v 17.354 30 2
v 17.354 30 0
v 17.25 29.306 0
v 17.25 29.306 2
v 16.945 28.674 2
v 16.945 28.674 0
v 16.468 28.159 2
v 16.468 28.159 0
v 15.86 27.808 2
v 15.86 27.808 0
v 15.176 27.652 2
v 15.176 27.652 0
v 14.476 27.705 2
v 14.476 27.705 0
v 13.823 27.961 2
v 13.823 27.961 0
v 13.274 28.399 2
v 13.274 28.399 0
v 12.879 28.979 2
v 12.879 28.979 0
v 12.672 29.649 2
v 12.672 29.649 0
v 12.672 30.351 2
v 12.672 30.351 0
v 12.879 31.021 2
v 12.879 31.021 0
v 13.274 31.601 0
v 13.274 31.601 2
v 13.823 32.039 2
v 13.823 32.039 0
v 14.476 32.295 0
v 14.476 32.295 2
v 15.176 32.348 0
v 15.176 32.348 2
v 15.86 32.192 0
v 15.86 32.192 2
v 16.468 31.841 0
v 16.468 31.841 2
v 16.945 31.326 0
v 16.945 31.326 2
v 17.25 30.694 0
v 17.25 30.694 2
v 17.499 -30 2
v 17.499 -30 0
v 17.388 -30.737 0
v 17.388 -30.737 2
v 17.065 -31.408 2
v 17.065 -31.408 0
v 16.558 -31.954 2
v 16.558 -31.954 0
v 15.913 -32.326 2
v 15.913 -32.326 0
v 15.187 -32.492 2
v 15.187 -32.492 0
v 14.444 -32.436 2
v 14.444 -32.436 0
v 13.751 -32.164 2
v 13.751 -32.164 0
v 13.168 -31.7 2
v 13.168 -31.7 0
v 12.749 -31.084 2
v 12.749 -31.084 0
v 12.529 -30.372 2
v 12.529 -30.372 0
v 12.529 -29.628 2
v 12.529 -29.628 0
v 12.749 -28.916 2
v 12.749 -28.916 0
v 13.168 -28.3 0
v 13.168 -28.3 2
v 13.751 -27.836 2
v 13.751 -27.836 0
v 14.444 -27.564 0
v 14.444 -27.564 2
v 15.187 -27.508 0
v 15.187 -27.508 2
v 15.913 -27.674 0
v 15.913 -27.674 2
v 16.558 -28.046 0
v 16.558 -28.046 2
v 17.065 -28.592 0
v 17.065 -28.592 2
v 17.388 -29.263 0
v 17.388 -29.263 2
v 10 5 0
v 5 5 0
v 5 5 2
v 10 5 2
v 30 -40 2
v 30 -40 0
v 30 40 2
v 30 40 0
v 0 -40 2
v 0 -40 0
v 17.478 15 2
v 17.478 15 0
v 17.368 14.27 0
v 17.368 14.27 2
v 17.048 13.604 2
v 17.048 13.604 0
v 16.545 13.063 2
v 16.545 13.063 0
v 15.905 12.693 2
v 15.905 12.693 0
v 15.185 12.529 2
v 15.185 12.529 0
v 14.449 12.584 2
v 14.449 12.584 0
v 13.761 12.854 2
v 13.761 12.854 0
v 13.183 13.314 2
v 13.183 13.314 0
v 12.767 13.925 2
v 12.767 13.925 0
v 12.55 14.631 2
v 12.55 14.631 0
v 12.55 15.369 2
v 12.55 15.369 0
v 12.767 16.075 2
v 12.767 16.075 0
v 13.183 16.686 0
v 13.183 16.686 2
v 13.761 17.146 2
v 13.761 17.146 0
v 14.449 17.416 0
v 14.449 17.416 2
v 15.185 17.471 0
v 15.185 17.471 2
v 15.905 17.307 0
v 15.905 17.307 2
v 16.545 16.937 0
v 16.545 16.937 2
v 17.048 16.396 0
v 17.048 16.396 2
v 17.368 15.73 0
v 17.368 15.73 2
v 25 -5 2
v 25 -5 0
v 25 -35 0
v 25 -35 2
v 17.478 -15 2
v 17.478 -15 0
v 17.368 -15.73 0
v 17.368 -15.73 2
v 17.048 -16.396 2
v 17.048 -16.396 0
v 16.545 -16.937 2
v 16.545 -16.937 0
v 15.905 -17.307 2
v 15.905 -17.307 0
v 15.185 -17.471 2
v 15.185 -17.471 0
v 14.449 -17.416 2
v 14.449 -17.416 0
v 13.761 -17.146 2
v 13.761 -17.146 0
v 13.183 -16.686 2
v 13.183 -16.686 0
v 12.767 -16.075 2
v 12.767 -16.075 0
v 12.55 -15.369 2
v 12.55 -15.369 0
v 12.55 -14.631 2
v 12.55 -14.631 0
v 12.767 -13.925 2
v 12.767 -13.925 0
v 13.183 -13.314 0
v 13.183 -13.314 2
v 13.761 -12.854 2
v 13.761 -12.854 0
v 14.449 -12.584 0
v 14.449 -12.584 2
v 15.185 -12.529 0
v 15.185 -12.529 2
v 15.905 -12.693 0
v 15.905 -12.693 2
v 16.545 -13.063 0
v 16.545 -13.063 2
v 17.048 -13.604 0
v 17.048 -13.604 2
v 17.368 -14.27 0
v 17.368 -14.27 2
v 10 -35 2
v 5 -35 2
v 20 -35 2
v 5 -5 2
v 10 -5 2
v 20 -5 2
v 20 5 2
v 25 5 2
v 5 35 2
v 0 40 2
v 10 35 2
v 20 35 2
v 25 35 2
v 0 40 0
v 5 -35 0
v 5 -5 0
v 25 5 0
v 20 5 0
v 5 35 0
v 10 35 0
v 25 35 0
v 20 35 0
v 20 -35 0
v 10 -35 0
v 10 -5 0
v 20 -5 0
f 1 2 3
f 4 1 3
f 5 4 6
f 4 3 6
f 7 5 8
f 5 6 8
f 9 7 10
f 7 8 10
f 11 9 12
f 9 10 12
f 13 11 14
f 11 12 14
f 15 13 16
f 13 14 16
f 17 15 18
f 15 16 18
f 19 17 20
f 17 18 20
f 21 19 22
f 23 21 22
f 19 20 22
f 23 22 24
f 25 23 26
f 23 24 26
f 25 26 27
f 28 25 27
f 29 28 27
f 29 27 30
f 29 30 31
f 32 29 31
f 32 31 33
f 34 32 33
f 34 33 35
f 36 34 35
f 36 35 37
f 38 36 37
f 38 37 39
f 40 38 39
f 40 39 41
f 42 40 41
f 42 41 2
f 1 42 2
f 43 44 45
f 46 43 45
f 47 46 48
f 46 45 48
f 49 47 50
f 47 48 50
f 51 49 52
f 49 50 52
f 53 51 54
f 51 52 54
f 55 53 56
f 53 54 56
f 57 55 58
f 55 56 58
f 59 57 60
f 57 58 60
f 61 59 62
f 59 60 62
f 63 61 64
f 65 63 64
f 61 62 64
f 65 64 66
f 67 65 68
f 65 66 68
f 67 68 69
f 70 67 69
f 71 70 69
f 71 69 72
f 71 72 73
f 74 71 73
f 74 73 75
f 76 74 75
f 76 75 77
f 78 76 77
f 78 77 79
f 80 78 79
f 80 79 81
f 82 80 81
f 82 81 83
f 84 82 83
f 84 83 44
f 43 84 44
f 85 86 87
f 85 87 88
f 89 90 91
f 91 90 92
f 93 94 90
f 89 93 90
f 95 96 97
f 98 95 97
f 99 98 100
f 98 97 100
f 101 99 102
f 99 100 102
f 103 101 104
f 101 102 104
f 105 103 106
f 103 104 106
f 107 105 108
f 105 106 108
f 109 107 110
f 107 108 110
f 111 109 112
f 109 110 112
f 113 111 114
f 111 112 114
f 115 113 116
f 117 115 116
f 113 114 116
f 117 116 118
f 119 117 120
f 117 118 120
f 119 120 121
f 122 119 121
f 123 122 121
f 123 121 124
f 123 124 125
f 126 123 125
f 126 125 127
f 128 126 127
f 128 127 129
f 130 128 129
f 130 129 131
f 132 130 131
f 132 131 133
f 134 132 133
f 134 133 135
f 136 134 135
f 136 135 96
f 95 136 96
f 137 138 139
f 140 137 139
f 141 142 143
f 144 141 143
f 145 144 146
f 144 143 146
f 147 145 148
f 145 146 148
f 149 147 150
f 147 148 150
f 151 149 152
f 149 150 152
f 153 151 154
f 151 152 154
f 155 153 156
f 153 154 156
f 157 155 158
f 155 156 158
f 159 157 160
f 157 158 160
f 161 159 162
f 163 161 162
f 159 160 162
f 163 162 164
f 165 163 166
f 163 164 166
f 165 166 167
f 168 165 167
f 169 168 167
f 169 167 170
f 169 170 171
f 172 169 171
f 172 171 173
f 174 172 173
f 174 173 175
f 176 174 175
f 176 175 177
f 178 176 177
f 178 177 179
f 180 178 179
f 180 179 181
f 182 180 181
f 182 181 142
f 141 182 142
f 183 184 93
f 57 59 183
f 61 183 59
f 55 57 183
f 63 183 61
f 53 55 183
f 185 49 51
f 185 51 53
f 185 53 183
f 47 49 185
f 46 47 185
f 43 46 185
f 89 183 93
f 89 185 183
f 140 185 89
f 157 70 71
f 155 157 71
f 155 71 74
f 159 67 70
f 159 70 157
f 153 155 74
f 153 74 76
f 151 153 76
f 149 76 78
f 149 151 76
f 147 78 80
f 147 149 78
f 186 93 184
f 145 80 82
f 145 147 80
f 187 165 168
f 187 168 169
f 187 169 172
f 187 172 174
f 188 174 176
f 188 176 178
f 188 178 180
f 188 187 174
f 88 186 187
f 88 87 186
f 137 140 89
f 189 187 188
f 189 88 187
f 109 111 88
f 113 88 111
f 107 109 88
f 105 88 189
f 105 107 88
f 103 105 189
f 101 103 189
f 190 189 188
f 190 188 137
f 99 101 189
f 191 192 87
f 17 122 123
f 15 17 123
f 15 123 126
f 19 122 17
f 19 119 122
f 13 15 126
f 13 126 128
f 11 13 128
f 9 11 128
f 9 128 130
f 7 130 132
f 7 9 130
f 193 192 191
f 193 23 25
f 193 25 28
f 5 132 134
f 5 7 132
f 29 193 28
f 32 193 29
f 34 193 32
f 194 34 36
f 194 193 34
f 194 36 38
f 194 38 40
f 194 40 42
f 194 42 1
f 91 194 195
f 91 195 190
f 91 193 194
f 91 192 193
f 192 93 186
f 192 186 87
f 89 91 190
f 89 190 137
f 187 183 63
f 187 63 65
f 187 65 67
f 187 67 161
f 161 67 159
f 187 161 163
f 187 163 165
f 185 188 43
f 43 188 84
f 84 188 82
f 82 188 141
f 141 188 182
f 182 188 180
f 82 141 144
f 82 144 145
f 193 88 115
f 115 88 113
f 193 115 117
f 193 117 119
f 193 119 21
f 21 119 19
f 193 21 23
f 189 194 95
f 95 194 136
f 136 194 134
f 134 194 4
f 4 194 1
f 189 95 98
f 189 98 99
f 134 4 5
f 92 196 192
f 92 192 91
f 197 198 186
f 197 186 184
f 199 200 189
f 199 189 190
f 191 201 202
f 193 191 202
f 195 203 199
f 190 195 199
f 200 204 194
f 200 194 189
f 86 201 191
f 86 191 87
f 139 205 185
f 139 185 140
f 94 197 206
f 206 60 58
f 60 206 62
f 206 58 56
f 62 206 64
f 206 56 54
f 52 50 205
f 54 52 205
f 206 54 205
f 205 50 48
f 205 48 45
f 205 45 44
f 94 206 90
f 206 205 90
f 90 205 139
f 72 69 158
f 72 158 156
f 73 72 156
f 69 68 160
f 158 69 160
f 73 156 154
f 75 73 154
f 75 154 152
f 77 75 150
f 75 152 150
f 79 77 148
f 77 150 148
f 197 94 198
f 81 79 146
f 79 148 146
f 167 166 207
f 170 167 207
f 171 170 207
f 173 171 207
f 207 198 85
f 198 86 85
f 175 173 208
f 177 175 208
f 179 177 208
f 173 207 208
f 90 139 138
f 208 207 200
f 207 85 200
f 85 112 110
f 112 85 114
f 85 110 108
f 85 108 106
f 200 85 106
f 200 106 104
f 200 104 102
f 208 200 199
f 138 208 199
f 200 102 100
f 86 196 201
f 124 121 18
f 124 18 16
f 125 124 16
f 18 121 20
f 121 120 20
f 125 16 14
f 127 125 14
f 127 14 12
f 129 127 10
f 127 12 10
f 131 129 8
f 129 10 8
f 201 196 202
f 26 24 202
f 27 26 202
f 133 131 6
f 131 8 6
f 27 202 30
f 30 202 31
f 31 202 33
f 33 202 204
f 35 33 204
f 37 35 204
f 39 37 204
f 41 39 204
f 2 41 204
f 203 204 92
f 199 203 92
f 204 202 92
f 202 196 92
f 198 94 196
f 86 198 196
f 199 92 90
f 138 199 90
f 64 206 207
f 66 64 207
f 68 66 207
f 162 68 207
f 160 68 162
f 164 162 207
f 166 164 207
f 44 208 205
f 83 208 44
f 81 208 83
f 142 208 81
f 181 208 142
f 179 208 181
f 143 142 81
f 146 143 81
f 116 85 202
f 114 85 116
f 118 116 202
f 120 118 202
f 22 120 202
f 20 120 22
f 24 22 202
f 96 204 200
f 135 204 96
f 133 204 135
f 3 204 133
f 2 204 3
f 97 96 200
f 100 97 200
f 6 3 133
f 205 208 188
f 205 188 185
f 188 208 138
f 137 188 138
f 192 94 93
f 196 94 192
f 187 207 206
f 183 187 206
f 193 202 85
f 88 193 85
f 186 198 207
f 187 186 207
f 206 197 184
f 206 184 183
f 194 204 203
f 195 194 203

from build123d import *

# Parameters (mm, degrees)
SKETCH_W      = 30
SKETCH_H      = 80
PAD_DEPTH     = 2
SKETCH001_R   = 2.354301
SKETCH001_R_2 = 2.478142
SKETCH001_R_3 = 2.498945
SKETCH001_W   = 5
SKETCH001_H   = 30
POCKET_DEPTH  = 5


with BuildPart() as part:
    # Sketch → Pad (new body)
    with BuildSketch(Plane.XY):
        with Locations((15, 0)):
            Rectangle(SKETCH_W, SKETCH_H)
    extrude(amount=PAD_DEPTH)

    # Sketch001 (on Face5 of Pad) → Pocket (cut)
    with BuildSketch(Plane(origin=(0, 0, 0), x_dir=(1, 0, 0), z_dir=(0, 0, -1))):
        with Locations((15, -30)):
            Circle(SKETCH001_R)
        with Locations((15, -15)):
            Circle(SKETCH001_R_2)
        with Locations((15, 15)):
            Circle(SKETCH001_R_2)
        with Locations((15, 30)):
            Circle(SKETCH001_R_3)
        with Locations((7.5, 20)):
            Rectangle(SKETCH001_W, SKETCH001_H)
        with Locations((22.5, 20)):
            Rectangle(SKETCH001_W, SKETCH001_H)
        with Locations((7.5, -20)):
            Rectangle(SKETCH001_W, SKETCH001_H)
        with Locations((22.5, -20)):
            Rectangle(SKETCH001_W, SKETCH001_H)
    extrude(amount=-POCKET_DEPTH, mode=Mode.SUBTRACT)


solid = part.part
